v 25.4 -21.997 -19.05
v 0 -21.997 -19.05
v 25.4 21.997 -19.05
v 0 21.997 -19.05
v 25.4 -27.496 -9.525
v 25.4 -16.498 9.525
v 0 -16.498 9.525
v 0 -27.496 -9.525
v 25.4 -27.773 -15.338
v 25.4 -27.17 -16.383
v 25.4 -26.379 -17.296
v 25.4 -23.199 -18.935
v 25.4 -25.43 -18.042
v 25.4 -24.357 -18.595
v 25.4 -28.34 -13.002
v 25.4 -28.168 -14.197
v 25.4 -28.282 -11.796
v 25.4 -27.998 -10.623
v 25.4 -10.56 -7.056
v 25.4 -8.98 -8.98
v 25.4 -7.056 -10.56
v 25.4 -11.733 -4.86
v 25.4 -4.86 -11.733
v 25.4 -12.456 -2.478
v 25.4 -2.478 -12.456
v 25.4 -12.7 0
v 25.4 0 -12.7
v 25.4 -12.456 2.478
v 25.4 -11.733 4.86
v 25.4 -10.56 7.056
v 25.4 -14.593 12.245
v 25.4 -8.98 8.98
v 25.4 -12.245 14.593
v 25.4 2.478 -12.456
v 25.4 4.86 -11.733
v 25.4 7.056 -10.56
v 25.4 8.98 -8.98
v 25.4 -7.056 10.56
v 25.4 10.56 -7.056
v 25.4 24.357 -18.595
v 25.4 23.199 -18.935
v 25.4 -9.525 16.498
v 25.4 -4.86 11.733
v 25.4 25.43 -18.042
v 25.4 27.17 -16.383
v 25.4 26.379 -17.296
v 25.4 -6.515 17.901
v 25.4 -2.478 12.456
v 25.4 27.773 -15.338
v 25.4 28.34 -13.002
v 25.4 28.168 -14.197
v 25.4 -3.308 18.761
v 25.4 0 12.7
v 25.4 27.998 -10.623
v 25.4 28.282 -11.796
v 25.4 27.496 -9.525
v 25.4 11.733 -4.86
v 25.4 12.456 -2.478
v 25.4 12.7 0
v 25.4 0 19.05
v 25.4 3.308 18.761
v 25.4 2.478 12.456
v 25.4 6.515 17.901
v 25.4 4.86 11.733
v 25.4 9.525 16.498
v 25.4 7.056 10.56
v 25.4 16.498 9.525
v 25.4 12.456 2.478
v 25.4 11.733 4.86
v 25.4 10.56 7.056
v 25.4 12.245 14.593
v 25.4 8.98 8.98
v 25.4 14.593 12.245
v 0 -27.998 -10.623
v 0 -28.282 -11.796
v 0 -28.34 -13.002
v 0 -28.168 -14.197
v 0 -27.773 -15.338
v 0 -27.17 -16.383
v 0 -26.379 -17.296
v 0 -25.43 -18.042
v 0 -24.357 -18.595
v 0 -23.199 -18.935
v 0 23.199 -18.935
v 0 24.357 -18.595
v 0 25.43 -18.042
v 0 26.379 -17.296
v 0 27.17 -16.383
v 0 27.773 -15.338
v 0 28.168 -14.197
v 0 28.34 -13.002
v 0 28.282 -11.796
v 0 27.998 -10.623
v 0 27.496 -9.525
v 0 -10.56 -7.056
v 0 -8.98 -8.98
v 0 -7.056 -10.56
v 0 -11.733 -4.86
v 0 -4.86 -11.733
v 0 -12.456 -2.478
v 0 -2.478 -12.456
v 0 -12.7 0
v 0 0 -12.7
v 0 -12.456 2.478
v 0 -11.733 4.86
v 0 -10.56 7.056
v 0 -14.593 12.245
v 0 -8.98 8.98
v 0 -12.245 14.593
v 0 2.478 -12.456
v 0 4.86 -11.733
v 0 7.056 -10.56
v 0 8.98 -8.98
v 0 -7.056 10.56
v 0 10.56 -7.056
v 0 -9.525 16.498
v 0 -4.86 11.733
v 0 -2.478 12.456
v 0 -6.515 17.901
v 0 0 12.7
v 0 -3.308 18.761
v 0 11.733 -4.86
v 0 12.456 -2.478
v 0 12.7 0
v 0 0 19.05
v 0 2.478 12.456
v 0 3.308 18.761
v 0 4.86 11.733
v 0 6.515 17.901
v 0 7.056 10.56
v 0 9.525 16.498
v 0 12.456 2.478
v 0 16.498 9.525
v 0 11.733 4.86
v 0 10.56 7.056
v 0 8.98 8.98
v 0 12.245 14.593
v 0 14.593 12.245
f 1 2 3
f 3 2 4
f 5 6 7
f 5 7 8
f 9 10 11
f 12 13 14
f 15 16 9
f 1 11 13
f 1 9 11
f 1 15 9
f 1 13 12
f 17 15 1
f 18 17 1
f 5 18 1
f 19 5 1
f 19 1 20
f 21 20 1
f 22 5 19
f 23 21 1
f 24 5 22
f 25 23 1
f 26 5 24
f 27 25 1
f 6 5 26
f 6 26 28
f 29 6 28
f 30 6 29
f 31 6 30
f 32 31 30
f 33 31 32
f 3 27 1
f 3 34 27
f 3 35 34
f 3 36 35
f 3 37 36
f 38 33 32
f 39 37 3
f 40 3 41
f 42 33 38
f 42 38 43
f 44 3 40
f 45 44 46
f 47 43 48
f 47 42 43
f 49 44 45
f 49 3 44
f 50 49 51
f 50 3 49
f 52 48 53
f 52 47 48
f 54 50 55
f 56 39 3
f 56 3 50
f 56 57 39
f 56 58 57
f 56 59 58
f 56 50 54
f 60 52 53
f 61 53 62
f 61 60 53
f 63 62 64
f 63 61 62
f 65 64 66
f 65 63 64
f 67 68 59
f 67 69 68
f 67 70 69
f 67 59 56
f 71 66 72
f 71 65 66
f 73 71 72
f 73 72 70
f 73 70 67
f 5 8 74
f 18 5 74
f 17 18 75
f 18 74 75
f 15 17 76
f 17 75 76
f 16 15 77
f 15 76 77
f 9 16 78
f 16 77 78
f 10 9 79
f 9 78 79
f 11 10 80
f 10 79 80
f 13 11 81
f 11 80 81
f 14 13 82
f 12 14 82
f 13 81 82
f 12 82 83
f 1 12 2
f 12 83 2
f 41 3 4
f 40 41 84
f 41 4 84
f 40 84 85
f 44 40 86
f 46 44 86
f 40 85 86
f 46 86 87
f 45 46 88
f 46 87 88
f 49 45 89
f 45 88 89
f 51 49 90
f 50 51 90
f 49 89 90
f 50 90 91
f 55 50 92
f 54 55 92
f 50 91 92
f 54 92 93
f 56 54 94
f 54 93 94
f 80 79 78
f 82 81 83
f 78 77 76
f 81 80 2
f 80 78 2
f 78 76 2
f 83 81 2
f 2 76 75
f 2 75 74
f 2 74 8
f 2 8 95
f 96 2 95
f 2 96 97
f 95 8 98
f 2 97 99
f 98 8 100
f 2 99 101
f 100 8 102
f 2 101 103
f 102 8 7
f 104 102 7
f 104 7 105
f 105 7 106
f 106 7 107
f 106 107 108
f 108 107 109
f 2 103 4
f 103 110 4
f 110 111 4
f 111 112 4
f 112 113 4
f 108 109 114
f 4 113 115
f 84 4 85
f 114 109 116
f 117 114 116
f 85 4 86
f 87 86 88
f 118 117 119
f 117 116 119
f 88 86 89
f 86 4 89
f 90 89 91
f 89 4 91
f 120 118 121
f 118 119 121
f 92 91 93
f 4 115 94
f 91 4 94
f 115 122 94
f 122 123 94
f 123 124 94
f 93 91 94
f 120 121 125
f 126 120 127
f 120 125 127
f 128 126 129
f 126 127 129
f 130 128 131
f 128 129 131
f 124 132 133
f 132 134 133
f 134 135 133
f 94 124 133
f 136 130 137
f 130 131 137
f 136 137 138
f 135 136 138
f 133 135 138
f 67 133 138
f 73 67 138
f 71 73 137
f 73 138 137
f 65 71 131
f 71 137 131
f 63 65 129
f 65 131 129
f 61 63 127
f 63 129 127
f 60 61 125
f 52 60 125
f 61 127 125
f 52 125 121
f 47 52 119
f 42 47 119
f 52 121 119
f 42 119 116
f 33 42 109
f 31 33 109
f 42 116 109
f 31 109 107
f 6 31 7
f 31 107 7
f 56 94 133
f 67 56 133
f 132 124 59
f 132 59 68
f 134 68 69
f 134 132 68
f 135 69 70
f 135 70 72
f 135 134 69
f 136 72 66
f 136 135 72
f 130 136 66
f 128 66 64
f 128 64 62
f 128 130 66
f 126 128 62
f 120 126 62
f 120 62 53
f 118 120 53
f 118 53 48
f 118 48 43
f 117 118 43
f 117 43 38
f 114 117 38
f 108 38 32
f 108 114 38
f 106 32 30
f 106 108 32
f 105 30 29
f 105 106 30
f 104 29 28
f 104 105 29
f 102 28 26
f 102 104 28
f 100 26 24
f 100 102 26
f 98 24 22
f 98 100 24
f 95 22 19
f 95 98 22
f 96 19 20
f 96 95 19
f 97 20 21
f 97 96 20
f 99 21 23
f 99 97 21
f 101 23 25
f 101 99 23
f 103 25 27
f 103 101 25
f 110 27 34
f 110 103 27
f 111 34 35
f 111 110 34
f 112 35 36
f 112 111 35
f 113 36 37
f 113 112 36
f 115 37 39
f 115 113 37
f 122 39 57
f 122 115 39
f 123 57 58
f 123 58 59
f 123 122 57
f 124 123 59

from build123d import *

# Parameters (mm, degrees)
F0_R     = 12.7
F1_DEPTH = 25.4


with BuildPart() as f1:
    # F0 (on Right) → F1 (new body)
    with BuildSketch(Plane.YZ):
        with BuildLine():
            ThreePointArc((0, -19.05), (13.470384, -13.470384), (19.05, 0))
            ThreePointArc((19.05, 0), (18.400887, 4.930503), (16.497784, 9.525))
            ThreePointArc((16.497784, 9.525), (0, 19.05), (-16.497784, 9.525))
            ThreePointArc((-16.497784, 9.525), (-16.497784, -9.525), (0, -19.05))
        make_face()
        Circle(F0_R, mode=Mode.SUBTRACT)
        with BuildLine():
            ThreePointArc((16.497784, 9.525), (18.400887, 4.930503), (19.05, 0))
            ThreePointArc((19.05, 0), (13.470384, -13.470384), (0, -19.05))
            Line((0, -19.05), (21.997045, -19.05))
            ThreePointArc((21.997045, -19.05), (27.496307, -15.875), (27.496307, -9.525))
            Line((27.496307, -9.525), (16.497784, 9.525))
        make_face()
        with BuildLine():
            Line((-21.997045, -19.05), (0, -19.05))
            ThreePointArc((0, -19.05), (-16.497784, -9.525), (-16.497784, 9.525))
            Line((-16.497784, 9.525), (-27.496307, -9.525))
            ThreePointArc((-27.496307, -9.525), (-27.496307, -15.875), (-21.997045, -19.05))
        make_face()
    extrude(amount=F1_DEPTH)


solid = f1.part
